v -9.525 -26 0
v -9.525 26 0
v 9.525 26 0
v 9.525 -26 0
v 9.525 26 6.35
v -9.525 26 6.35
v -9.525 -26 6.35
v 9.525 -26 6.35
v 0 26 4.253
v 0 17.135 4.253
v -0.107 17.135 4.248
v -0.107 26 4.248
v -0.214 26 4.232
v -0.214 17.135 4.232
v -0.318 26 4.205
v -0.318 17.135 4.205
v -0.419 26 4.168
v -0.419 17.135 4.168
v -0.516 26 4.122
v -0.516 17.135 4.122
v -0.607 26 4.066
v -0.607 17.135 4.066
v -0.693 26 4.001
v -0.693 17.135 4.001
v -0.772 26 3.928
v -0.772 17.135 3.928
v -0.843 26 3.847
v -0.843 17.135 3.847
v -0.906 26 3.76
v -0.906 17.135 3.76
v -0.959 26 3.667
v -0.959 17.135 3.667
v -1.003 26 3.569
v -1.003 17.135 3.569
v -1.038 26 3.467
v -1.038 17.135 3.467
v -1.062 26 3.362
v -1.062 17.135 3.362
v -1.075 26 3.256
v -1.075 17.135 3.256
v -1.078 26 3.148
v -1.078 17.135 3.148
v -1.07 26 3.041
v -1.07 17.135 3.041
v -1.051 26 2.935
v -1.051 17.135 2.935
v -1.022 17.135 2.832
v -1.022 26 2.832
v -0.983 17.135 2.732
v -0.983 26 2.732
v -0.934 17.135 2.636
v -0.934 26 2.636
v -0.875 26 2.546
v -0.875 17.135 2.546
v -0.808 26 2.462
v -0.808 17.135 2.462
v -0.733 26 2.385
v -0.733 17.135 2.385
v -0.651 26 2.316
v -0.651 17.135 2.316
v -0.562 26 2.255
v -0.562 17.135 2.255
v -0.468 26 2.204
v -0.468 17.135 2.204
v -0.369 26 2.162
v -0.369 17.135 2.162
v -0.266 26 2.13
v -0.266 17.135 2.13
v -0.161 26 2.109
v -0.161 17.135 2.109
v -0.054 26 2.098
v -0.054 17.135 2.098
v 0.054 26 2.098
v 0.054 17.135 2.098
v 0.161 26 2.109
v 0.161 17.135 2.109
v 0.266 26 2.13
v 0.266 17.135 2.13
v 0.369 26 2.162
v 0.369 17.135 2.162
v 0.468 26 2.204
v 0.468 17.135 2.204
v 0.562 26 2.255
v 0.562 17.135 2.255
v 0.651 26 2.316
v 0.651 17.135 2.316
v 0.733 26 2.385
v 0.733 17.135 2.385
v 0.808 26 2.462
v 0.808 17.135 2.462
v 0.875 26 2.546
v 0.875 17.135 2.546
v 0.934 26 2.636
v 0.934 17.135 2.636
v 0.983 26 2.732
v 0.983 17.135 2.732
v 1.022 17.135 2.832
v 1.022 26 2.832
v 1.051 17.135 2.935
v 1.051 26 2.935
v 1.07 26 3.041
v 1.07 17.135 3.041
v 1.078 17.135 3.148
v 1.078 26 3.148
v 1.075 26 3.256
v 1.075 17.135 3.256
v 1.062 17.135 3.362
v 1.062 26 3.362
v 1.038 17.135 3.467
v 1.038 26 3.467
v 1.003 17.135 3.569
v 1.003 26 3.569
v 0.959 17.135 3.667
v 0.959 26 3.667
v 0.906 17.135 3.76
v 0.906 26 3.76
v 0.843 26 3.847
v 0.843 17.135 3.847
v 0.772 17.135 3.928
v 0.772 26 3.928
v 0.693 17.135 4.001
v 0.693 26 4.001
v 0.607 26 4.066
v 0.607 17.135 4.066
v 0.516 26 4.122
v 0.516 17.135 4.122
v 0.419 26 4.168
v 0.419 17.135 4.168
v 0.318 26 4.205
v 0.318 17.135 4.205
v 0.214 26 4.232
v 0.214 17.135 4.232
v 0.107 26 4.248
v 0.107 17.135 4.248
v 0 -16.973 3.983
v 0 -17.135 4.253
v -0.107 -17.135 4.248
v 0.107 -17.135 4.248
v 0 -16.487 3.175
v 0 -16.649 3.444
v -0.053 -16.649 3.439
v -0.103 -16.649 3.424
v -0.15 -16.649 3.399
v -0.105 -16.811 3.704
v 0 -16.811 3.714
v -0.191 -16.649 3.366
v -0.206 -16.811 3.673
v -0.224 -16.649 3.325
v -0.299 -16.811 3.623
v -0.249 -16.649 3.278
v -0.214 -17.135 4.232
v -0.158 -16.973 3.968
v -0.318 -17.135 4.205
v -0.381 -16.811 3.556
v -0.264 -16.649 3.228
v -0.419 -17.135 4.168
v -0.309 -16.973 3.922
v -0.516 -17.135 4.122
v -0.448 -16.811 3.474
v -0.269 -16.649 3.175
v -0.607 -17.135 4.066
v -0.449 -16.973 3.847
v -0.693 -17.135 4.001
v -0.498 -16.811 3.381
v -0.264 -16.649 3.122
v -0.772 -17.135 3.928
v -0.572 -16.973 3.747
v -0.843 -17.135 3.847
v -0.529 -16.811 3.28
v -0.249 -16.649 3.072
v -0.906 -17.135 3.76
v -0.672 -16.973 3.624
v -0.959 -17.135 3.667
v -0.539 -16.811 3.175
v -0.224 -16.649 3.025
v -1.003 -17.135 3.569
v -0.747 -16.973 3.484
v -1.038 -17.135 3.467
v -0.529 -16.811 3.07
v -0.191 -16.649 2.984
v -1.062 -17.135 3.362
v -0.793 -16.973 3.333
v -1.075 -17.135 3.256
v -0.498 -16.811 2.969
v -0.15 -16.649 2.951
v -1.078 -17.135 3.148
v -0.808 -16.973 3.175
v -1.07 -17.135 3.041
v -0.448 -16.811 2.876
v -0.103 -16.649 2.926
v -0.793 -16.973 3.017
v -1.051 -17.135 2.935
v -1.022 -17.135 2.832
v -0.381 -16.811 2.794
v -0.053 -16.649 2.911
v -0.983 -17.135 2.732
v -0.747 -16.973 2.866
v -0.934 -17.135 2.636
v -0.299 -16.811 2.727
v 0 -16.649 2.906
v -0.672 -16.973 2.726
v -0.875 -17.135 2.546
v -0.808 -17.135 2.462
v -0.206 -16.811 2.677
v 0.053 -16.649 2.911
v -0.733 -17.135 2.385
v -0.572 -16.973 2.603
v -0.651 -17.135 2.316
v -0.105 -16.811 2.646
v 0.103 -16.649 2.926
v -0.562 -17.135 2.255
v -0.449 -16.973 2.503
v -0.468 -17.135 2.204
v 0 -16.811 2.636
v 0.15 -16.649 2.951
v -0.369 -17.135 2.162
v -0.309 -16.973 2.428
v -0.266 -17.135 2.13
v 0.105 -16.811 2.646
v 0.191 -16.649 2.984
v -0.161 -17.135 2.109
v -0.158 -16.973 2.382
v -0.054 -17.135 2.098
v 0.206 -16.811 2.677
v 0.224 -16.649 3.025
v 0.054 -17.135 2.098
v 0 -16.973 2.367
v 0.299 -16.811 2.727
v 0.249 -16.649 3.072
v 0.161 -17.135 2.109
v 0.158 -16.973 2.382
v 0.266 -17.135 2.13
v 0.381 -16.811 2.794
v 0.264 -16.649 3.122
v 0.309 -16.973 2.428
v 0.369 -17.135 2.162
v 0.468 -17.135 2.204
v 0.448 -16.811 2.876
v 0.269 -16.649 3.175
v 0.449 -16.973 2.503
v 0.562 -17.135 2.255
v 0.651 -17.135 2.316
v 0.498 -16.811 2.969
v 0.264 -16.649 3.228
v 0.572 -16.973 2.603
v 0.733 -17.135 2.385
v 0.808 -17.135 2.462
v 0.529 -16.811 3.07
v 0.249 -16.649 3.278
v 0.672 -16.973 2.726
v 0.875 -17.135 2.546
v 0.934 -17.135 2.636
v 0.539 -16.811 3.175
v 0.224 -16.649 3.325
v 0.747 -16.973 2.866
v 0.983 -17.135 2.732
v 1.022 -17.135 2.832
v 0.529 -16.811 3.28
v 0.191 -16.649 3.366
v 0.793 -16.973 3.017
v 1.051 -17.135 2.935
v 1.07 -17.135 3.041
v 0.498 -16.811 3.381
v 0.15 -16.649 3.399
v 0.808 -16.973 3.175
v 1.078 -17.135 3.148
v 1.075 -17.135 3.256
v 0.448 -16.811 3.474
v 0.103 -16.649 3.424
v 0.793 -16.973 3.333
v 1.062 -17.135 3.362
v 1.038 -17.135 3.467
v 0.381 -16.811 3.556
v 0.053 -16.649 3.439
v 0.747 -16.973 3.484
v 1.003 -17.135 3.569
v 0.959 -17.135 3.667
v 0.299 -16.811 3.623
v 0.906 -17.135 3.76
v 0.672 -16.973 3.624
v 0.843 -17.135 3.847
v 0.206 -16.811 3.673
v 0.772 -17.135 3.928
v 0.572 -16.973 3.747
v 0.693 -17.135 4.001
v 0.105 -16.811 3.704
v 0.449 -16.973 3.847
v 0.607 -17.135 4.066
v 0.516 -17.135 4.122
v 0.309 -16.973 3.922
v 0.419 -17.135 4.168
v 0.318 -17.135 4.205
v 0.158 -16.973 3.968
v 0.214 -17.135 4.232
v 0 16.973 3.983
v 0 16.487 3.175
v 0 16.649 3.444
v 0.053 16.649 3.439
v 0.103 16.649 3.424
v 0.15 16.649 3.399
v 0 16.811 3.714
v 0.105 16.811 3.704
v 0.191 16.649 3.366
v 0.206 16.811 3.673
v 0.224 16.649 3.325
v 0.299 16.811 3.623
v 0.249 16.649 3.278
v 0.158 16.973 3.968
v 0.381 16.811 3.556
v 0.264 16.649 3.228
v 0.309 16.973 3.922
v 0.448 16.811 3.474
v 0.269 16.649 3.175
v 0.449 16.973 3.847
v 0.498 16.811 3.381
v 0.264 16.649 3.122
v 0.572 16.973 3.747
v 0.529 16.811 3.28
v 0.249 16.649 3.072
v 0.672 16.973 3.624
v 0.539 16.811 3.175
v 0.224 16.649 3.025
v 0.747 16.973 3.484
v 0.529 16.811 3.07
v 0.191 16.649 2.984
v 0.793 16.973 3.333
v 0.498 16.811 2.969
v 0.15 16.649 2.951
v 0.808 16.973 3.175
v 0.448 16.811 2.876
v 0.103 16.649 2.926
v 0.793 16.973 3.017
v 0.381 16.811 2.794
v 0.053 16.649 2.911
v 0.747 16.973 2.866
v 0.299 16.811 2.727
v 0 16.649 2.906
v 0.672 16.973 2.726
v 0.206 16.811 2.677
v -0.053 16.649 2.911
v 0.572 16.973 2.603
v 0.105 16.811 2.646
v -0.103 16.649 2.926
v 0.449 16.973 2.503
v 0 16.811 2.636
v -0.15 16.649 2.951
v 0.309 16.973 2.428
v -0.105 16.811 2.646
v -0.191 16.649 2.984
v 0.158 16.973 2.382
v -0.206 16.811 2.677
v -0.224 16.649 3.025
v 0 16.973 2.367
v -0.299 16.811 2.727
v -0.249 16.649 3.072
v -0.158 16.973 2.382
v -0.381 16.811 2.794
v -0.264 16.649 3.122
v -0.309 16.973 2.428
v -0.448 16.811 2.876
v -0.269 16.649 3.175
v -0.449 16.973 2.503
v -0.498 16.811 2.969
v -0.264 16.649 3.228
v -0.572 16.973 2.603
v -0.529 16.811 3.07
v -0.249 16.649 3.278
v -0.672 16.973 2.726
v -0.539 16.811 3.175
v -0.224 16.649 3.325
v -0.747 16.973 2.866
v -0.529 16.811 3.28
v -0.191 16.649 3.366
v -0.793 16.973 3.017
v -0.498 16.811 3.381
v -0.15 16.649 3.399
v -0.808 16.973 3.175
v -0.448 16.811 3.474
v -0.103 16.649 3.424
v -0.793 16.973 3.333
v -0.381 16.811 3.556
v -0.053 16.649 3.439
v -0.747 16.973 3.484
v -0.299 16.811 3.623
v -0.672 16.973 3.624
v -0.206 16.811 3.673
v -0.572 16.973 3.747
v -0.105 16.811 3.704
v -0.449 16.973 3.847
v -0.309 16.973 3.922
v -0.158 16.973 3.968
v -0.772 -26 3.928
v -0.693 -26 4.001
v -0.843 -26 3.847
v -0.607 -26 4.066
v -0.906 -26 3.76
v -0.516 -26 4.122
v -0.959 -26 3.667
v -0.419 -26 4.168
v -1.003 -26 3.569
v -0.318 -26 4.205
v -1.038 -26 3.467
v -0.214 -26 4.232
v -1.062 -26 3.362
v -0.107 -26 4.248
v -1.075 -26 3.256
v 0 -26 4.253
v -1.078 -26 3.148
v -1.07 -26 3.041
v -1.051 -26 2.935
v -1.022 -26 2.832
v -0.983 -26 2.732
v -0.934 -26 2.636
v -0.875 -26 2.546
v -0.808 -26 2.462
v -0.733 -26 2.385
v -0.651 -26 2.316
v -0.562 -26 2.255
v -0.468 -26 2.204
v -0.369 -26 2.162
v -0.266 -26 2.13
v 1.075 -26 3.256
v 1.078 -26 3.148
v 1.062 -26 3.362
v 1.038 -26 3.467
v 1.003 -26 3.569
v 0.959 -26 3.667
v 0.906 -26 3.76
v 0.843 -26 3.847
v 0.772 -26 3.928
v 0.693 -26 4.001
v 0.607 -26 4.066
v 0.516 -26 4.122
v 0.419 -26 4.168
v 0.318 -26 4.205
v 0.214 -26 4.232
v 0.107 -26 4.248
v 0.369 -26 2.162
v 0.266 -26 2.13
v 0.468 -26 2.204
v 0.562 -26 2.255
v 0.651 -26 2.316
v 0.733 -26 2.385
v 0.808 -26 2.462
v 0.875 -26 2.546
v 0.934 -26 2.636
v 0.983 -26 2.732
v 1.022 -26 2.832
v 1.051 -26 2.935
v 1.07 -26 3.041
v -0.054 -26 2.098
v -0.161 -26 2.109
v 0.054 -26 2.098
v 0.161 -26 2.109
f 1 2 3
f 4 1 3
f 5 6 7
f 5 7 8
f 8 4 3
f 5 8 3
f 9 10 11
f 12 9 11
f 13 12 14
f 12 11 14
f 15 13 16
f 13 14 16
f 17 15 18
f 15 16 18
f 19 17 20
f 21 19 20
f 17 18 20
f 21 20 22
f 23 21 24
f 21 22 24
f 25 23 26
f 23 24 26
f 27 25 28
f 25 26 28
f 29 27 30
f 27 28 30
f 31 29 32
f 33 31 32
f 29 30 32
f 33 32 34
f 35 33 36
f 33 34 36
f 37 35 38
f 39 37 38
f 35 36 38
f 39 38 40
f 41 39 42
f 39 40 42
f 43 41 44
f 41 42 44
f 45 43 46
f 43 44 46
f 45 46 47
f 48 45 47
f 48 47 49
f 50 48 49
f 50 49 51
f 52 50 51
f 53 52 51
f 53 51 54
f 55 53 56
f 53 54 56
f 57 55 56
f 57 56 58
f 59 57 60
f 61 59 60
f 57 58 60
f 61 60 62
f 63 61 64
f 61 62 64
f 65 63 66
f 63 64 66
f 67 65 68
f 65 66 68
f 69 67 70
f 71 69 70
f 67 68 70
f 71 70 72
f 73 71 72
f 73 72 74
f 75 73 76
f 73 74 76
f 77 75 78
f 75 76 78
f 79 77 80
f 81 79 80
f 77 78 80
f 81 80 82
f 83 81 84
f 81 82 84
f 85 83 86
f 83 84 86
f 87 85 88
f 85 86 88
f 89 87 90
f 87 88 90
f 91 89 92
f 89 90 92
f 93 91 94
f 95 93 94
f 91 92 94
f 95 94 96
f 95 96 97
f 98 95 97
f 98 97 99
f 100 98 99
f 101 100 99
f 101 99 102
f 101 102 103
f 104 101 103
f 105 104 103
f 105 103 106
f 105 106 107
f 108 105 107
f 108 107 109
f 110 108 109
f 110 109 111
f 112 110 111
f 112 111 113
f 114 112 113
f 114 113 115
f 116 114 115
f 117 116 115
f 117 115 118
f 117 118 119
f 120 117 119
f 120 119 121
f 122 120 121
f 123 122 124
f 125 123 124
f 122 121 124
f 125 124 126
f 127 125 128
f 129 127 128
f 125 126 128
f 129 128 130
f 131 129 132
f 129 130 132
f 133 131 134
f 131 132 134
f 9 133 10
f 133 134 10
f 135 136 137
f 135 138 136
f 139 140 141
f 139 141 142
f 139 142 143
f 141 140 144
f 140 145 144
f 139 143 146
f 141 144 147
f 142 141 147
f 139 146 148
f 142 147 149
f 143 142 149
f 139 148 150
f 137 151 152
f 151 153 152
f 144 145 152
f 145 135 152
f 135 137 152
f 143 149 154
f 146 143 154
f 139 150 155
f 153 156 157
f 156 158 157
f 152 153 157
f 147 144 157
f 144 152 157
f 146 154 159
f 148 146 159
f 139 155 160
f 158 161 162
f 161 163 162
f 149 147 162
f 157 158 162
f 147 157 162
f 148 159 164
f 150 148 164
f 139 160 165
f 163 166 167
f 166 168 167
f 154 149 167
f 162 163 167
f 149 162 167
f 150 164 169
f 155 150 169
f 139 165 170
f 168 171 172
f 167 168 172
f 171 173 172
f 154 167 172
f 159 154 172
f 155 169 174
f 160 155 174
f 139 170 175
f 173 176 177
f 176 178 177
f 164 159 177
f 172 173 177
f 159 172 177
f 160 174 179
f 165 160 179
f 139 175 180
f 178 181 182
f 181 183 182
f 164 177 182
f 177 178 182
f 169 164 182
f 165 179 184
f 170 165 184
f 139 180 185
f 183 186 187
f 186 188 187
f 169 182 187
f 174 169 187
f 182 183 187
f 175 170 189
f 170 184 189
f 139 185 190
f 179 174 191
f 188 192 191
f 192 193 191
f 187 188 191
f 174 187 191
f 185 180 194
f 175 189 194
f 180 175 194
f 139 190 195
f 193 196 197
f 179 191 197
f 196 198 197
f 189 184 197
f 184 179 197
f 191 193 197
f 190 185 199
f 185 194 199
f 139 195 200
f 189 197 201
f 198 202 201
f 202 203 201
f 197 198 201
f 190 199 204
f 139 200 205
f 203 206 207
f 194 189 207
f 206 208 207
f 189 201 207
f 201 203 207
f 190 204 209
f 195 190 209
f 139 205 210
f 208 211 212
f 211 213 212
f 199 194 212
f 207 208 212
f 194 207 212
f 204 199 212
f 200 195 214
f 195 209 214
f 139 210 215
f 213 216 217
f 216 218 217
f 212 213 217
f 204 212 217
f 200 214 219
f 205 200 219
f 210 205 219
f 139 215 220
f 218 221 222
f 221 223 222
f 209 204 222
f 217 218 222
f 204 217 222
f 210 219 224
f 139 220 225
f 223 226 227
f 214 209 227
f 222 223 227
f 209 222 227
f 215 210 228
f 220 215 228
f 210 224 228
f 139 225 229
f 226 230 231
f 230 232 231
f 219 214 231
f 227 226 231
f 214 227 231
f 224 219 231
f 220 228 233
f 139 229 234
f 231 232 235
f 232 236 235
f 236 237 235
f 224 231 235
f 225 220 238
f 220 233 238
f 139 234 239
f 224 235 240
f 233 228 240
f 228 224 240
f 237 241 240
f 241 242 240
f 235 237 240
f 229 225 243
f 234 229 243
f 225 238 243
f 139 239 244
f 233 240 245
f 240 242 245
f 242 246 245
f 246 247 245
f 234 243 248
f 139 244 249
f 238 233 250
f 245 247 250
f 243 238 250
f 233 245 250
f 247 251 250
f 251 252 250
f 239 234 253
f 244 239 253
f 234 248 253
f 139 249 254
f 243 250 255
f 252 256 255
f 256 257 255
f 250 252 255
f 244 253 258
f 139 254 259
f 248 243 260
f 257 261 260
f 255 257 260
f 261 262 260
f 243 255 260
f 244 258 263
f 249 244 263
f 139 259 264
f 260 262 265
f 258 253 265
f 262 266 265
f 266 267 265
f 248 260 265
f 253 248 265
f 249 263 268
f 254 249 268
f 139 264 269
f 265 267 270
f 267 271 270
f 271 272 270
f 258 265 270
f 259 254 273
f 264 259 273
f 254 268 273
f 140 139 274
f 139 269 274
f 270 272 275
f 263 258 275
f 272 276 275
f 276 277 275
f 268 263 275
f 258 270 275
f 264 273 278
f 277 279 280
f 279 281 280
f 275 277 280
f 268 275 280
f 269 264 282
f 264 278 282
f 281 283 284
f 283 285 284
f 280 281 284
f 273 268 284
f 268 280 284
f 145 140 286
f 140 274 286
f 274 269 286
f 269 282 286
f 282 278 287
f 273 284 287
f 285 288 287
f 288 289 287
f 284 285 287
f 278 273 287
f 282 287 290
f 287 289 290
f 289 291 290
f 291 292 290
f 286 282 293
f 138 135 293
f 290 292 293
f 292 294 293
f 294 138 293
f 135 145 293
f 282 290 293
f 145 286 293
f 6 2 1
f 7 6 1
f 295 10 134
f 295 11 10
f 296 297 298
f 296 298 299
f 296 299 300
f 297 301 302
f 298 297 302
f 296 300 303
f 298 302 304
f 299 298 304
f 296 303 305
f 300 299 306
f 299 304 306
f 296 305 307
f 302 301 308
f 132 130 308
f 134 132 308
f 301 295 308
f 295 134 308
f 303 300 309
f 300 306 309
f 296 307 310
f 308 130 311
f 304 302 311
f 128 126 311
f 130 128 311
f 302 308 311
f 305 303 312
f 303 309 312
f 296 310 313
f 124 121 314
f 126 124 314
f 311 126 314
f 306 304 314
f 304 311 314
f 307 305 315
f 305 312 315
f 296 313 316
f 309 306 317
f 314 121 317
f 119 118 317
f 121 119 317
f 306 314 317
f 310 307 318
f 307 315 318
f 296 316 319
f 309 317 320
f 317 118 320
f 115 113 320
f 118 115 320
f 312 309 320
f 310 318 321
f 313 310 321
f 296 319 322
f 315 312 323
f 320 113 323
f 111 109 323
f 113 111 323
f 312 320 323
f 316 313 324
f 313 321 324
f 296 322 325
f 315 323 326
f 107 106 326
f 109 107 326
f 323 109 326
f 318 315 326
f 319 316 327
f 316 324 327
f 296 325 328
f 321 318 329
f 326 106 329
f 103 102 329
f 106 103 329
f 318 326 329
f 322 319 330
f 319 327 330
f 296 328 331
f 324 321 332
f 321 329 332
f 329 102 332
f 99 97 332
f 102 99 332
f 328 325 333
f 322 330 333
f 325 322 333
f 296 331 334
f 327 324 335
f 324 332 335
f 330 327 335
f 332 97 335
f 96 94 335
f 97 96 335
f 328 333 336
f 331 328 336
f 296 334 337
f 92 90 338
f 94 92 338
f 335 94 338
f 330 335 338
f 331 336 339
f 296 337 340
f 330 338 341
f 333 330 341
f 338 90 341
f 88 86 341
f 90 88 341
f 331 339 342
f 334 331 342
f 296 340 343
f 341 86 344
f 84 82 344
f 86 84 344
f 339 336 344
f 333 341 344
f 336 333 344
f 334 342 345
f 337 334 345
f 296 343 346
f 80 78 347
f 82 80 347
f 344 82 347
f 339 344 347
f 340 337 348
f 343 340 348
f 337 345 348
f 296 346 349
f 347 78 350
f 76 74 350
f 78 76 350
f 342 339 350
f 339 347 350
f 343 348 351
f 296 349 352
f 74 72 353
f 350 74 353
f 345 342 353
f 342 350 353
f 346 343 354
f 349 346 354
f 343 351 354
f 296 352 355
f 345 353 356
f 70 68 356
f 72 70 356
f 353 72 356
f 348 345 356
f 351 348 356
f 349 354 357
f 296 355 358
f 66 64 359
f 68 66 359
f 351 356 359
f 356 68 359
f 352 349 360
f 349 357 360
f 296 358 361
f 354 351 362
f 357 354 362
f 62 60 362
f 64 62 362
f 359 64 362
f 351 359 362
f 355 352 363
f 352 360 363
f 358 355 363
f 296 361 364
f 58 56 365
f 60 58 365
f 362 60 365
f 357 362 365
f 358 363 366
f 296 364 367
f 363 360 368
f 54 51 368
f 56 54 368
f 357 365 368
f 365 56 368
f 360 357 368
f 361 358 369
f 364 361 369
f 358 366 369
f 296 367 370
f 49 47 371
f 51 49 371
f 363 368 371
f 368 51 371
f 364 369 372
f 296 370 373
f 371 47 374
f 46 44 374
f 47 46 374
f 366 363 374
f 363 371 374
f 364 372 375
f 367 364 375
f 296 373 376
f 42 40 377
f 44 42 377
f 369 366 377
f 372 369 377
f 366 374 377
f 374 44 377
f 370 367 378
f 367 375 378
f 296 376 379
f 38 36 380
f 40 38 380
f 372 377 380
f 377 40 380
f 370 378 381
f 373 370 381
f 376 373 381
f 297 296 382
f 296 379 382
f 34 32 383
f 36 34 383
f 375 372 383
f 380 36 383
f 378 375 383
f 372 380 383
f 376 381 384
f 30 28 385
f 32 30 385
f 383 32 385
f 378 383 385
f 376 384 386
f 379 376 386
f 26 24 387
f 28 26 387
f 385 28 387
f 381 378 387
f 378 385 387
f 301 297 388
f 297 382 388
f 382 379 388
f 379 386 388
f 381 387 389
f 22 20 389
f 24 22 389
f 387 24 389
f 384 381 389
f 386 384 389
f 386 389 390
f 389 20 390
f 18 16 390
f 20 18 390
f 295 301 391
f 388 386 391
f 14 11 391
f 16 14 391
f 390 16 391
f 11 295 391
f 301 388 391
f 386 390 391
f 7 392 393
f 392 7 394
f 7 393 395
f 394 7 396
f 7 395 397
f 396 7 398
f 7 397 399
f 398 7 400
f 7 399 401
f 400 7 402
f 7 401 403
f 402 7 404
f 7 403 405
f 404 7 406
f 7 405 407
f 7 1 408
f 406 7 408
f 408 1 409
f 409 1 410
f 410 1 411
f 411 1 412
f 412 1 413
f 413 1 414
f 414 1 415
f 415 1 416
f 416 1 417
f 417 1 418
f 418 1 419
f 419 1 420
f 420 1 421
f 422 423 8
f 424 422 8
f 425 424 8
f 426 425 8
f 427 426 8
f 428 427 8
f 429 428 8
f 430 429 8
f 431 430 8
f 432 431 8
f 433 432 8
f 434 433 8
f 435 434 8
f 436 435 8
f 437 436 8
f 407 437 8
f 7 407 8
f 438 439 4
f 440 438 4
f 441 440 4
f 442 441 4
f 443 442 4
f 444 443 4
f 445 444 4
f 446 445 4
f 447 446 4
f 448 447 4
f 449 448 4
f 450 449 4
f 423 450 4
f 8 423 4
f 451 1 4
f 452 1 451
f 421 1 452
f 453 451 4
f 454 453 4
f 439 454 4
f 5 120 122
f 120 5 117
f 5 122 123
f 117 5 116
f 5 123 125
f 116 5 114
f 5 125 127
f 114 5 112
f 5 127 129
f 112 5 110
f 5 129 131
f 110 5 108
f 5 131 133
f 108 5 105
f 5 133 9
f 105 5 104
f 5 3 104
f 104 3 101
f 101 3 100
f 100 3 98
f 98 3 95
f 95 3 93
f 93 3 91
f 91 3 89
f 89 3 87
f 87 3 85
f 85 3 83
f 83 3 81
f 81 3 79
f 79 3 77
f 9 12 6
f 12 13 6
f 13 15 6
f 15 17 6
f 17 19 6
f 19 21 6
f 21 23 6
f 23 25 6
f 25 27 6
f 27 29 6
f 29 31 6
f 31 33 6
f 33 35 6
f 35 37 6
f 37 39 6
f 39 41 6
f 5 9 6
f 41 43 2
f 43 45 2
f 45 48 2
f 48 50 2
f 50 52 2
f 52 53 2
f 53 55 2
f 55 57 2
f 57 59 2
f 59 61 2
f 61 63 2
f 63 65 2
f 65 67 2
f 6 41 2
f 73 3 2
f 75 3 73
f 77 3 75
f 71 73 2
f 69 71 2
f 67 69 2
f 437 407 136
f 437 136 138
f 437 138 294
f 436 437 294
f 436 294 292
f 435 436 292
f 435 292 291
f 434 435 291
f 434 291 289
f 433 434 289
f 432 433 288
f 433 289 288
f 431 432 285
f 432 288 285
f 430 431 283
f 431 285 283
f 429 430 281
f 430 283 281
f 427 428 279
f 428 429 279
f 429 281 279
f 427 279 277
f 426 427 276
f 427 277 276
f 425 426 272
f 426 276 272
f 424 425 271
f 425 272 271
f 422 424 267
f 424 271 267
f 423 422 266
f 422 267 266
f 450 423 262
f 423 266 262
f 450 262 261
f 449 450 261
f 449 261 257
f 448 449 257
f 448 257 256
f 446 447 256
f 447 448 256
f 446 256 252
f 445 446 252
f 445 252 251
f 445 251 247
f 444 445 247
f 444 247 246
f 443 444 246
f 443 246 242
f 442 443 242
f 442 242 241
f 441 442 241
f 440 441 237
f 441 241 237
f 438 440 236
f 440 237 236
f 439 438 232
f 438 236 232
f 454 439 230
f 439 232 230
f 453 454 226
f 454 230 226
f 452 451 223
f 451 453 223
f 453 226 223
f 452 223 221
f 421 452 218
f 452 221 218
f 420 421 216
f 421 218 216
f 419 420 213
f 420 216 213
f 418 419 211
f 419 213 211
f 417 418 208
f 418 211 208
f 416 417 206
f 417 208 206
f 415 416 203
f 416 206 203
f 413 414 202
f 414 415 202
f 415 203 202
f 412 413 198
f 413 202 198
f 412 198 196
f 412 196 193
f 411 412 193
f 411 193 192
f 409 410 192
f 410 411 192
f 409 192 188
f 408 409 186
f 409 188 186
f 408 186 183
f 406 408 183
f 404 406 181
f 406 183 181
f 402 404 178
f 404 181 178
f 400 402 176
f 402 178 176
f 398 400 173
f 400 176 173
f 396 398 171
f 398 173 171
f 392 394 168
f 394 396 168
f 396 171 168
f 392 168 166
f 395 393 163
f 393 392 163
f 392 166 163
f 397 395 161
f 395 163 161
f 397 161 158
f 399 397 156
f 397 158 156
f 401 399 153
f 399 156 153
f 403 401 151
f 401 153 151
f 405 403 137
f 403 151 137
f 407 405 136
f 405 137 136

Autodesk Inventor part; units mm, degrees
ref_plane "YZ Plane" through (0, 0, 0) normal (1, 0, 0) x (0, 1, 0)
ref_plane "XZ Plane" through (0, 0, 0) normal (0, 1, 0) x (-1, 0, 0)
ref_plane "XY Plane" through (0, 0, 0) normal (0, 0, 1) x (1, 0, 0)
sketch "Sketch1" plane through (0, 0, 0) normal (0, 0, 1) x (1, 0, 0)
  line L0 (-9.525, -26) -> (9.525, -26)
  line L1 (9.525, -26) -> (9.525, 26)
  line L2 (9.525, 26) -> (-9.525, 26)
  line L3 (-9.525, 26) -> (-9.525, -26)
  line L4 (-9.525, -26) -> (9.525, 26) construction
  line L5 (9.525, -26) -> (-9.525, 26) construction
  point P0 (0, 0)
  dimension "d0" = 19.05
  dimension "d1" = 52
extrude "Extrusion1" add sketch "Sketch1" along normal blind 6.35
sketch "Sketch3" plane through (-9.525, 26, 0) normal (0, 1, 0) x (1, 0, 0)
  line L0 (19.05, 0) -> (0, 0) projected
  line L1 (0, 0) -> (0, -6.35) projected
  line L2 (19.05, -6.35) -> (0, -6.35) projected
  line L3 (19.05, 0) -> (19.05, -6.35) projected
  line L4 (0, 0) -> (0, -6.35) projected
  line L5 (0, 0) -> (19.05, -6.35)
  point P0 (9.525, 0)
  point P1 (9.525, -3.175)
hole "Hole1" at (0, 26, 3.175) direction (0, -1, 0) diameter 2.156 depth 8.865 tip angle 118 thread size "4-40 UNC" class "2B" standard "ANSI Unified Screw Threads"
mirror "Mirror1" about plane through (0, 0, 0) normal (0, 1, 0) of "Hole1"
equation "\"d0\" = sensorHolderDepth"
equation "\"d1\" = detectorWidth"
equation "\"d2\" = acrylicThickness"
equation "\"acrylicThickness\" = 6.35"
equation "\"height\" = 127"
equation "\"width\" = 127"
equation "\"depth\" = 273.05"
equation "\"mirrorAngle\" = 5deg"
equation "\"detectorWidth\" = 52"
equation "\"detectorHeight\" = 52"
equation "\"mirrorThickness\" = 3.175"
equation "\"fresnelThickness\" = 0.1"
equation "\"focalLength\" = 76.2"
equation "\"ior\" = 1.49"
equation "\"centerThickness\" = 1.524"
equation "\"fresnelAngle\" = 90deg"
equation "\"fresnelEffectiveDiameter\" = 152.4"
equation "\"mirrorSuppourtWidth\" = 38.1"
equation "\"backGrooveBit\" = 4.8006"
equation "\"detectorOpeningWidth\" = 76.2"
equation "\"detectorOpeningHeight\" = 76.2"
equation "\"sensorHolderSensorHeight\" = 53.975"
equation "\"sensorHolderSensorWidth\" = 53.975"
equation "\"oRingWidth\" = 1.5875"
equation "\"sensorHolderORingID\" = 203.2"
equation "\"sensorHolderFlushORingID\" = 304.8"
equation "\"frontBackORingID\" = 419.1"
equation "\"mirrorGroove\" = 19.05"
equation "\"backMirrorGroove\" = 6.35"
equation "\"fresnelMirrorChamfer\" = 6.35"
equation "\"mirrorGrooveMill\" = 3.175"
equation "\"sensorHolderDepth\" = 19.05"
equation "\"frameAcrylicThickness\" = 9.525"
equation "\"internalAcrylicThicnkess\" = 6.35"
equation "\"internalAcrylicThickness\" = 6.35"
equation "\"aerogelClearence\" = 3.175"
equation "\"backplanePCBWidth\" = 76.2"
equation "\"backplanePostionOffsett\" = 12.7"
equation "\"backplaneHoleOffsett\" = 6.35"
equation "\"backplanePCBHeight\" = 76.2"
equation "\"moduleSlotClearence\" = 0.79375"
properties part number "detectorSuppourt" material "ABS Plastic"
